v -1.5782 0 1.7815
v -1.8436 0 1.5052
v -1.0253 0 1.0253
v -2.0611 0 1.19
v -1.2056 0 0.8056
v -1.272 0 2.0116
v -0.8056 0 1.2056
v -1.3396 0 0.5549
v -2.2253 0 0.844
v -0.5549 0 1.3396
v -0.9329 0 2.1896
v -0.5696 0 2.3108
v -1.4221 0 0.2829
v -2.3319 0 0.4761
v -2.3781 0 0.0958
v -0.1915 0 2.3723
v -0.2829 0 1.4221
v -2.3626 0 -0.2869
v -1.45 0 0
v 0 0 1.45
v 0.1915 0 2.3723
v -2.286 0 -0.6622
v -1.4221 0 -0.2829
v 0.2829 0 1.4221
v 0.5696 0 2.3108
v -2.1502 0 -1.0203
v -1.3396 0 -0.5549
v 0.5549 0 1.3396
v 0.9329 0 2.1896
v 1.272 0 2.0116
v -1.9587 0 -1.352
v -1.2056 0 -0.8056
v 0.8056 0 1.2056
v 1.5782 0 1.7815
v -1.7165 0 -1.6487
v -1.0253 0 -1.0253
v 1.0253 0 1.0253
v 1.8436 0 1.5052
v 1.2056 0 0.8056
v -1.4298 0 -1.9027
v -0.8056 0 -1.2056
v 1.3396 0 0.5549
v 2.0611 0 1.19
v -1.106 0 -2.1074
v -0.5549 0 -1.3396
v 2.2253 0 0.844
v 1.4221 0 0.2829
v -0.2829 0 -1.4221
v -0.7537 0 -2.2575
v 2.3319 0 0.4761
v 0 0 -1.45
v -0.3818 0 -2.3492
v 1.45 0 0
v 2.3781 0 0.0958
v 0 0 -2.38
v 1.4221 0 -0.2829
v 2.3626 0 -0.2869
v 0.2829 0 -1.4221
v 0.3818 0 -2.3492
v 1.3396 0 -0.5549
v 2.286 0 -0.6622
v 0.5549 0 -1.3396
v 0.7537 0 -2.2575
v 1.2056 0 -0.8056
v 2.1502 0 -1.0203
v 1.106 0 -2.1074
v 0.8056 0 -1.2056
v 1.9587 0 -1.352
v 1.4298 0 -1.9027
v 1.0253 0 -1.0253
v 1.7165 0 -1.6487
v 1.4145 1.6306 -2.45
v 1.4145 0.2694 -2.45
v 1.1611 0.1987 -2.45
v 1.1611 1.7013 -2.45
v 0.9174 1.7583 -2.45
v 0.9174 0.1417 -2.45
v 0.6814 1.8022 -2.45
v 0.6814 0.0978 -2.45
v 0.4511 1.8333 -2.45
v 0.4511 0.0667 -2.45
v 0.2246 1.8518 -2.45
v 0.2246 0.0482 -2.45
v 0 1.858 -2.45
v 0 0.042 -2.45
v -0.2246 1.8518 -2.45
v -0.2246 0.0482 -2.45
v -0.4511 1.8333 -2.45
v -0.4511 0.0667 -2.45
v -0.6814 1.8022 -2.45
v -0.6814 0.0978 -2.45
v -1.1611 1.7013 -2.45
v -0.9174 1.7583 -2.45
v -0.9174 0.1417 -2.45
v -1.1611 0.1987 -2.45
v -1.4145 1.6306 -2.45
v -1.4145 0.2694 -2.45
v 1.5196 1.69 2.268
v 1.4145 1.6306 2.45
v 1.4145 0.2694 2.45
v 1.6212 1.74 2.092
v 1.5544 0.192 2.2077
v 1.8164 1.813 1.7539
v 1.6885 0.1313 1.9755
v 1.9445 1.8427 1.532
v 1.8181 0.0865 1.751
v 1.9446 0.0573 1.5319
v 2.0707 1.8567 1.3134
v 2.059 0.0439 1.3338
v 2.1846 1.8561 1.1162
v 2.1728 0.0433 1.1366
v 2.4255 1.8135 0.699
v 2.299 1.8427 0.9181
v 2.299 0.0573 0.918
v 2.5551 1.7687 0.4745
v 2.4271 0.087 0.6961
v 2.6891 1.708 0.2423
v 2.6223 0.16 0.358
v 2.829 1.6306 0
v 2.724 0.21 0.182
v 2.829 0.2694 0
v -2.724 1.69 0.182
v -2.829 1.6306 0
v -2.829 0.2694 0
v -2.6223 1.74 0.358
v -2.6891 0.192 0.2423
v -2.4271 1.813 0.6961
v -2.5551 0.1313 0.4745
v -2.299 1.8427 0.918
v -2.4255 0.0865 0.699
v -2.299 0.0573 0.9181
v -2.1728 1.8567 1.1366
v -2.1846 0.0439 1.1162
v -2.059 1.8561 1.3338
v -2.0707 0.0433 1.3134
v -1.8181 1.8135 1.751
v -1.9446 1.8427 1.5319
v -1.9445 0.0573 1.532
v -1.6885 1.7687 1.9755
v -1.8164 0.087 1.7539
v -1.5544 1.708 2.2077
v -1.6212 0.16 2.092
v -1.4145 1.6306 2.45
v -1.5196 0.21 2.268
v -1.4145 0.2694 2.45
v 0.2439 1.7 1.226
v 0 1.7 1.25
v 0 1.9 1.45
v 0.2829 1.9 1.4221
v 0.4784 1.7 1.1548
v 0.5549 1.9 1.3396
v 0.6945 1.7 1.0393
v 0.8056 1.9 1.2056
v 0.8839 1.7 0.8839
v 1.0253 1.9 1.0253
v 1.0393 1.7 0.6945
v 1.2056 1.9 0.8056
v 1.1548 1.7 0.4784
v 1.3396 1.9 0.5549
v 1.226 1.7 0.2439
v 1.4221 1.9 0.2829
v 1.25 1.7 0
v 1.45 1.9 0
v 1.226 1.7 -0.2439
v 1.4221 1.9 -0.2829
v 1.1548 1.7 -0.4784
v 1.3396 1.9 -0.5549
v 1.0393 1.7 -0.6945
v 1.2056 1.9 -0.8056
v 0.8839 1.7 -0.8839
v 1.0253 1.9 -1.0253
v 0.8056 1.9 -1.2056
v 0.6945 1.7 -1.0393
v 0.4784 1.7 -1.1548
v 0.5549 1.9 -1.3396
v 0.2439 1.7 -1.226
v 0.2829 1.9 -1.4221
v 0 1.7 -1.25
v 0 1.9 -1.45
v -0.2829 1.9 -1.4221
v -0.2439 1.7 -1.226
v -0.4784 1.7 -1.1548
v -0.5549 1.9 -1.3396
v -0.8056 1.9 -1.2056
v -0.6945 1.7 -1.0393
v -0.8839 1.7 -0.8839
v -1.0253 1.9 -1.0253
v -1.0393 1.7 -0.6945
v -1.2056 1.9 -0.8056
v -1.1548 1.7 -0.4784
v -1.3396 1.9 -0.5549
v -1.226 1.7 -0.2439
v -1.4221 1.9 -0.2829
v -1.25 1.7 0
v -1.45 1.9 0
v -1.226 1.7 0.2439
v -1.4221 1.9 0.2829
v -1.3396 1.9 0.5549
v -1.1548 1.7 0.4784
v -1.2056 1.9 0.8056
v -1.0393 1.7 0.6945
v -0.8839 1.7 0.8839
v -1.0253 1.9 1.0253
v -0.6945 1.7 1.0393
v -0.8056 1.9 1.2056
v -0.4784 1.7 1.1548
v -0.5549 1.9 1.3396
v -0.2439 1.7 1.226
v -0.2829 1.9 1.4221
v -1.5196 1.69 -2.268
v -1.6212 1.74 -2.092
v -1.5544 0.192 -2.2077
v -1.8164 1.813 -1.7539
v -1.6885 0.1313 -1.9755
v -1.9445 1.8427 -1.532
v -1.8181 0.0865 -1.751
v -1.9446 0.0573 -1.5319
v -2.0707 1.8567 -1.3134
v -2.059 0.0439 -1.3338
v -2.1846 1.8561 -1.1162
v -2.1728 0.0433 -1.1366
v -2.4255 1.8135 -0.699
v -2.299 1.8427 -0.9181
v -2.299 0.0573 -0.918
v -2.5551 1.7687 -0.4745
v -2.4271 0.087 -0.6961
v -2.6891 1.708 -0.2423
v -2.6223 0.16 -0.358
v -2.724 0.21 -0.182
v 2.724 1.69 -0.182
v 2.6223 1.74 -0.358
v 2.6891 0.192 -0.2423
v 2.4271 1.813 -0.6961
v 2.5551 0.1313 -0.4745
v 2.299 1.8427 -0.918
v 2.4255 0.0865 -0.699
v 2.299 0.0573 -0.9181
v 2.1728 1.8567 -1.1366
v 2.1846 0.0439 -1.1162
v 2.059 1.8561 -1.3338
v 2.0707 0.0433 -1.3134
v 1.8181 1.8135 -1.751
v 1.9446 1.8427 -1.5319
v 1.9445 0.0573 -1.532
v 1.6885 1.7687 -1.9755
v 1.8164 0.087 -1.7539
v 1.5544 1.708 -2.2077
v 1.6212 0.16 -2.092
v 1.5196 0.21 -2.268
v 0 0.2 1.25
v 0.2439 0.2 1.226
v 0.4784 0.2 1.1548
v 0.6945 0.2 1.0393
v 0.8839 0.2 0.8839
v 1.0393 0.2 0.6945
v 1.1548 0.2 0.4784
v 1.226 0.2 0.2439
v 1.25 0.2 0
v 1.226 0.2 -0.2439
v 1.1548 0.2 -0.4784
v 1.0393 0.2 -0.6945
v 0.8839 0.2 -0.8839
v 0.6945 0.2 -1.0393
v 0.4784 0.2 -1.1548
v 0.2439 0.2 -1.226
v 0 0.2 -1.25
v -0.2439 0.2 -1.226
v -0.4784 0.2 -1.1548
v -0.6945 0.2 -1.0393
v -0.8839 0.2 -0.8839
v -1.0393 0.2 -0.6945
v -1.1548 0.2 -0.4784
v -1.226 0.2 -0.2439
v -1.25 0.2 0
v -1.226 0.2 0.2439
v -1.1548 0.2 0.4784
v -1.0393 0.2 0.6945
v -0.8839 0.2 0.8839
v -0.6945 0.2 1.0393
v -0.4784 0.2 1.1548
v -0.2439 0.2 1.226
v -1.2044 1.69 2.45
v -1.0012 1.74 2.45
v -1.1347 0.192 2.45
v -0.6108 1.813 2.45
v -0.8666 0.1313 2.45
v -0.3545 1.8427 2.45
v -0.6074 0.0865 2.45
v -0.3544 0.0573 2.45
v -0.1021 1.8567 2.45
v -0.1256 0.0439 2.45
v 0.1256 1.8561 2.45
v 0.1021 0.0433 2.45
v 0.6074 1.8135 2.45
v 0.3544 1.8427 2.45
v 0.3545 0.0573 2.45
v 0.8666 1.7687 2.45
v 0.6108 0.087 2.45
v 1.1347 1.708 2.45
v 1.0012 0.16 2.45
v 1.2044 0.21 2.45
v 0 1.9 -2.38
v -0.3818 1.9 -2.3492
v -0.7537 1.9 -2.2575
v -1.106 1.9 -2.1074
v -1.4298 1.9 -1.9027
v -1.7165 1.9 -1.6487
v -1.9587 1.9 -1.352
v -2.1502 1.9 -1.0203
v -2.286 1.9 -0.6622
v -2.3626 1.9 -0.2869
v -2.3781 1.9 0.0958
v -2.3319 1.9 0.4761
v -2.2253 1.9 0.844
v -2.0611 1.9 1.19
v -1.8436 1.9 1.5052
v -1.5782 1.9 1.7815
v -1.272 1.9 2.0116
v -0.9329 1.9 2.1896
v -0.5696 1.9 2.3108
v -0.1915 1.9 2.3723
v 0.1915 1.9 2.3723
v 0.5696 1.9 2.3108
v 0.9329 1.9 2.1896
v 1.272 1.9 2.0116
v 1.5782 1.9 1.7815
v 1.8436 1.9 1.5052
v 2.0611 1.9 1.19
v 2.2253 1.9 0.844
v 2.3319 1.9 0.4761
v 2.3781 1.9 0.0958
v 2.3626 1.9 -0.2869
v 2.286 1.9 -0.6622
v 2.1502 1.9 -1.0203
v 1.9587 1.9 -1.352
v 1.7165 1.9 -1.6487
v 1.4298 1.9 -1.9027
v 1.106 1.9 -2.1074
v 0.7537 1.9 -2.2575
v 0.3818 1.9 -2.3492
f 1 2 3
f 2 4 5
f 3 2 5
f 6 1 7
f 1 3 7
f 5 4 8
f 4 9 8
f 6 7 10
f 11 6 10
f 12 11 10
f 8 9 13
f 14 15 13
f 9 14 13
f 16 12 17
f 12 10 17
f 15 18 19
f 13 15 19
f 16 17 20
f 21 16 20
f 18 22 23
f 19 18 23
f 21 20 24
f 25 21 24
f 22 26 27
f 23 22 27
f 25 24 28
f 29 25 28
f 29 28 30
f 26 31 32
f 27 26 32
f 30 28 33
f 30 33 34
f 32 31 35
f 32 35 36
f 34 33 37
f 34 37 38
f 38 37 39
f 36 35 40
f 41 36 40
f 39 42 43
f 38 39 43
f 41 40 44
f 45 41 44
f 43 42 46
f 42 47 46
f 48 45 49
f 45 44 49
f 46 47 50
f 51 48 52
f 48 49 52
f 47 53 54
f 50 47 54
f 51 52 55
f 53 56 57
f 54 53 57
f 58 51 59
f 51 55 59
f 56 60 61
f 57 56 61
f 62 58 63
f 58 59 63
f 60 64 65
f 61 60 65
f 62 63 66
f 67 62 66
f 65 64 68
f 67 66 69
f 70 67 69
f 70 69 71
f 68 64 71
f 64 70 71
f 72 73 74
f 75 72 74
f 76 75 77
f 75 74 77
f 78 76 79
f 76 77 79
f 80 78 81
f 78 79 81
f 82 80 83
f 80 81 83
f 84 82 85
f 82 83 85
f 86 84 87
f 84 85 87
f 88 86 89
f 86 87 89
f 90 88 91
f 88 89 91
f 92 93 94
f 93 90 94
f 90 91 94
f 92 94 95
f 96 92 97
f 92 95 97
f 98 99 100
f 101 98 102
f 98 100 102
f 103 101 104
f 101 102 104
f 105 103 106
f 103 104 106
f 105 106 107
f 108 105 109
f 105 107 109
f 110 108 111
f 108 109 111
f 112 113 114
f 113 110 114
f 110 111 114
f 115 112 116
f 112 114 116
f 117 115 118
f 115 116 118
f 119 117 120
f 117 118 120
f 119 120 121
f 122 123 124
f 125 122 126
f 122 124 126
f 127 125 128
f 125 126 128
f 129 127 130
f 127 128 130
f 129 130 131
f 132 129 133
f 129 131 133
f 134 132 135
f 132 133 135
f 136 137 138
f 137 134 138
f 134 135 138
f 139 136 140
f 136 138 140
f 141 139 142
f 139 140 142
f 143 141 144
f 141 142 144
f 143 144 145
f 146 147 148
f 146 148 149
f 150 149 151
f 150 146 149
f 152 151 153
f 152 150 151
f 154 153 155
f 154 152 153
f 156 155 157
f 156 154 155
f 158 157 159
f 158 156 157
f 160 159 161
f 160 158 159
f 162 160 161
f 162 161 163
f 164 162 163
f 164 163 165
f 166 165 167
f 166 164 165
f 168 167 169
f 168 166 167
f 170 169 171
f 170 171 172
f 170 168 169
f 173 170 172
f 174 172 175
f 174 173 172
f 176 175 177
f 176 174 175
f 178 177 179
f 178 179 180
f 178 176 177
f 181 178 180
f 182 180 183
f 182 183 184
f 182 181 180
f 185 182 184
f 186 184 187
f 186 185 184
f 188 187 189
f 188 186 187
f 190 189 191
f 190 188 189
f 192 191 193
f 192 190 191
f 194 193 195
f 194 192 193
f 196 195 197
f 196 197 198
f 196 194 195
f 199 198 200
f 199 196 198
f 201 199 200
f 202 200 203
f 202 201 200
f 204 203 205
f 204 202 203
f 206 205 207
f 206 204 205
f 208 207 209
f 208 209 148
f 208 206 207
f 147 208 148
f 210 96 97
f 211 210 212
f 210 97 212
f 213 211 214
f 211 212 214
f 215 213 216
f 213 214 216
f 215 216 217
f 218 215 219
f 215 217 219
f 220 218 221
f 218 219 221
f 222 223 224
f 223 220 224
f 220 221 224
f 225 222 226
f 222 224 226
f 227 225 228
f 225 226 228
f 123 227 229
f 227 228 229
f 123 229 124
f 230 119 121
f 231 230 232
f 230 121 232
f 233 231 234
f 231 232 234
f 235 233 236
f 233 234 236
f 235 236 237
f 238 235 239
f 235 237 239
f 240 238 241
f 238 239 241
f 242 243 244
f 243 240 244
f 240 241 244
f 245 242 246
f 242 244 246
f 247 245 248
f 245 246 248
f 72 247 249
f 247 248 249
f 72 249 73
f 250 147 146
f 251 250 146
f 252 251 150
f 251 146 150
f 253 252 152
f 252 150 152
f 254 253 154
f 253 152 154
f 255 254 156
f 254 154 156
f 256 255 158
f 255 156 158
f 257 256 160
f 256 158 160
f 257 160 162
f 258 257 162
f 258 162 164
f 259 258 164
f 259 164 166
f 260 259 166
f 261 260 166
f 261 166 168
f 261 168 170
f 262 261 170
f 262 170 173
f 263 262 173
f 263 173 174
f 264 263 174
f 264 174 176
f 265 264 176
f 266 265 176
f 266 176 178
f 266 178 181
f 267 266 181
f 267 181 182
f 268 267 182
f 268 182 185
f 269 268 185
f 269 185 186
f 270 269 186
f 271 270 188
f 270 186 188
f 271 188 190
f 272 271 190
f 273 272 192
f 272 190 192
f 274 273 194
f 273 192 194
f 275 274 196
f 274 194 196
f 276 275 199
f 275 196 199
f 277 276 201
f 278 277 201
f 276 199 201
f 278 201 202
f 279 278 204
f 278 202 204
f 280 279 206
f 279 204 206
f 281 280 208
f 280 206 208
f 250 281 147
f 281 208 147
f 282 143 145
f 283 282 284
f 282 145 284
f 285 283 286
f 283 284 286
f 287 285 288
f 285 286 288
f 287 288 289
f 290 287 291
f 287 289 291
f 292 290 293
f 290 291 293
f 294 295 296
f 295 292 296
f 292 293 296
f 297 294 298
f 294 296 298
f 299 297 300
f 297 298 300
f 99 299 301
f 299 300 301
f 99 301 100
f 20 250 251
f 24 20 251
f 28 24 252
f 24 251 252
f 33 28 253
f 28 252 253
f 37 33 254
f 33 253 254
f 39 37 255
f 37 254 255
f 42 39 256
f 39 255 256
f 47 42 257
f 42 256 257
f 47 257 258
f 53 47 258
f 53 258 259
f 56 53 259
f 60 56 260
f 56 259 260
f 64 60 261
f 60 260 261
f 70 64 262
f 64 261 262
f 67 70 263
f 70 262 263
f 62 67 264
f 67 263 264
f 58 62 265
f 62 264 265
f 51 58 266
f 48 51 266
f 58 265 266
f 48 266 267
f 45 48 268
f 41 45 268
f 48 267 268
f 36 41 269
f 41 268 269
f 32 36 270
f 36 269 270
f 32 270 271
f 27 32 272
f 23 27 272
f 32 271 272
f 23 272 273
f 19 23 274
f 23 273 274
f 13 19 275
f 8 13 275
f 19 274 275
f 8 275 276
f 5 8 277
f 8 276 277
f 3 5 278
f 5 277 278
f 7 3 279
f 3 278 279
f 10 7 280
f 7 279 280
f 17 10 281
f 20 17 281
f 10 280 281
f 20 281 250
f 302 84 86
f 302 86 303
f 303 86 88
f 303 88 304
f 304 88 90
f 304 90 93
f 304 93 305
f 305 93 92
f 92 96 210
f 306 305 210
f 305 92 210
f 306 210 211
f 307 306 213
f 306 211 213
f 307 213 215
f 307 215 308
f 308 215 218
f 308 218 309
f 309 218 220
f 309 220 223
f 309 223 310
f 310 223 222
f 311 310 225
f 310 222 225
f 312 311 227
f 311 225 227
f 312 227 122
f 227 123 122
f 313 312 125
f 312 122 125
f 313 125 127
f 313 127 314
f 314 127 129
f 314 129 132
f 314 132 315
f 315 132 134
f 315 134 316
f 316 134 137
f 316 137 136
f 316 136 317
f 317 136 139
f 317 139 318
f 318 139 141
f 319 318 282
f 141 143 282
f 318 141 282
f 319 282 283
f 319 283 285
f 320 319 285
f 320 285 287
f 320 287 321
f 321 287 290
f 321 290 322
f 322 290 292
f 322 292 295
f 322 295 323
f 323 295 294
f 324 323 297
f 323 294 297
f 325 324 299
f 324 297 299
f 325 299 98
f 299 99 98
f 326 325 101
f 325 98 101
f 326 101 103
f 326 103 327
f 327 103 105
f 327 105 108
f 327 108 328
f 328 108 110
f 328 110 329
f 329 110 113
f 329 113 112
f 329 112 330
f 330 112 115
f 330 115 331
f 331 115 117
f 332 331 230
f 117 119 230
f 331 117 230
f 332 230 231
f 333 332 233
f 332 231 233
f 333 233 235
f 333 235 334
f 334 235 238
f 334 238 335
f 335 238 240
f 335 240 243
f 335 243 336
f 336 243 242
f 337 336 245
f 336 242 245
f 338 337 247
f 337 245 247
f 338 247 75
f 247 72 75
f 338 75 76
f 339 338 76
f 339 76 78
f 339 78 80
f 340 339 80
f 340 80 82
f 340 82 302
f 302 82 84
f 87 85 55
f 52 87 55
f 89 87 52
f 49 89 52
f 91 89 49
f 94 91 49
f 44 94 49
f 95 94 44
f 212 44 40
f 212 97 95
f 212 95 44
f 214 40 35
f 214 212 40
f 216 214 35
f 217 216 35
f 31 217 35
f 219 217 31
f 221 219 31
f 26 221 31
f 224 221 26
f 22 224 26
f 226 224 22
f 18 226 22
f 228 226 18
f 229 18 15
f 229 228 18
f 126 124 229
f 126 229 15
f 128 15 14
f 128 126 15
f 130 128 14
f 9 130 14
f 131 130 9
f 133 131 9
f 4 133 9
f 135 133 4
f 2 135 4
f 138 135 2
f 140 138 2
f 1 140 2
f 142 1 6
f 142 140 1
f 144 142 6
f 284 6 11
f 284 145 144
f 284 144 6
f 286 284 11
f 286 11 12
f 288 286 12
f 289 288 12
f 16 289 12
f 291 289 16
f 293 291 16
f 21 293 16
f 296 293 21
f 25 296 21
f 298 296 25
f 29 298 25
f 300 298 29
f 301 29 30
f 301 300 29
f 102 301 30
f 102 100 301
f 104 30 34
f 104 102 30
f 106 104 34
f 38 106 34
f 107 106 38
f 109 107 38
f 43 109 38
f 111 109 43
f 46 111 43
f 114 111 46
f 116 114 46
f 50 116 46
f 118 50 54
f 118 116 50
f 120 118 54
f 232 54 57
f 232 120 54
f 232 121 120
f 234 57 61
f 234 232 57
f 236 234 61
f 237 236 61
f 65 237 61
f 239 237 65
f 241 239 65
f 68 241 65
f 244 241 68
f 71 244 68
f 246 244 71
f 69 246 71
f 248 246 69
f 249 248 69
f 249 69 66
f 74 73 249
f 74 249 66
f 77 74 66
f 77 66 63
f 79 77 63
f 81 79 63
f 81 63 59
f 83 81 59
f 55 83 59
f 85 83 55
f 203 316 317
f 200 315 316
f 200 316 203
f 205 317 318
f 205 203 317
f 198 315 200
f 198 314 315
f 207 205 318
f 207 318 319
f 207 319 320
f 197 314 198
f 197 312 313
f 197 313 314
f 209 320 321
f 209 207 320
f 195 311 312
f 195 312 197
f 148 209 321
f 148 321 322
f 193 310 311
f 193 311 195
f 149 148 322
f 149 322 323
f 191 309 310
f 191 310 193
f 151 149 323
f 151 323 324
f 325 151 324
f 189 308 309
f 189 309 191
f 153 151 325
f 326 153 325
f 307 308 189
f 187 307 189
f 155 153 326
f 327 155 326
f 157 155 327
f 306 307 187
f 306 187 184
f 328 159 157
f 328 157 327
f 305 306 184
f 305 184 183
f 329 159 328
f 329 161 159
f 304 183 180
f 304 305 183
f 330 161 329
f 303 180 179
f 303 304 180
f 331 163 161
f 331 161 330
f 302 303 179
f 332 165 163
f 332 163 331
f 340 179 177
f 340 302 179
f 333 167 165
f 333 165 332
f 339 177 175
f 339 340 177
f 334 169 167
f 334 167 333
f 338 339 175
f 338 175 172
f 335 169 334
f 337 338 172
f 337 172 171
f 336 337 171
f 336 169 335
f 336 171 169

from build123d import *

# Parameters (mm, degrees)
BOSS_EXTRUDE1_DEPTH = 1.9
SKETCH2_R           = 1.25
CUT_EXTRUDE1_DEPTH  = 5.19712203
CHAMFER1_SIZE       = 0.2


with BuildPart() as part:
    # Sketch1 → Boss-Extrude1 (new body)
    with BuildSketch(Plane(origin=(0, 0, 0), x_dir=(1, 0, 0), z_dir=(0, 1, 0))):
        Polygon((1.41450816, 2.45), (-1.41450816, 2.45), (-2.829016319, 0), (-1.41450816, -2.45), (1.41450816, -2.45), (2.829016319, 0), align=None)
    extrude(amount=BOSS_EXTRUDE1_DEPTH)

    # Sketch2 → Cut-Extrude1 (cut, through all)
    with BuildSketch(Plane(origin=(0, 1.9, 0), x_dir=(1, 0, 0), z_dir=(0, 1, 0))):
        with Locations(Location((0, 0, 0), (0, 0, 270))):
            Circle(SKETCH2_R)
    extrude(amount=-CUT_EXTRUDE1_DEPTH, mode=Mode.SUBTRACT)

    # Chamfer1
    chamfer1_edges = [part.edges().sort_by_distance(p)[0] for p in [
        (0, 0, -1.25),
        (0, 1.9, -1.25),
    ]]
    chamfer(chamfer1_edges, length=CHAMFER1_SIZE)

    # Sketch3 → Cut-Revolve1 (revolve, cut)
    with BuildSketch(Plane(origin=(0, 0, 0), x_dir=(0, 0, -1), z_dir=(1, 0, 0)), mode=Mode.PRIVATE) as cut_revolve1_sk:
        Polygon((-2.88, 1.9), (-2.38, 1.9), (-2.88, 1.6), align=None)
        Polygon((-2.88, 0.3), (-2.88, 0), (-2.38, 0), align=None)
    revolve(cut_revolve1_sk.sketch.rotate(Axis((0, 0, 0), (0, 1, 0)), 180), axis=Axis((0, 0, 0), (0, 1, 0)), mode=Mode.SUBTRACT)


solid = part.part
